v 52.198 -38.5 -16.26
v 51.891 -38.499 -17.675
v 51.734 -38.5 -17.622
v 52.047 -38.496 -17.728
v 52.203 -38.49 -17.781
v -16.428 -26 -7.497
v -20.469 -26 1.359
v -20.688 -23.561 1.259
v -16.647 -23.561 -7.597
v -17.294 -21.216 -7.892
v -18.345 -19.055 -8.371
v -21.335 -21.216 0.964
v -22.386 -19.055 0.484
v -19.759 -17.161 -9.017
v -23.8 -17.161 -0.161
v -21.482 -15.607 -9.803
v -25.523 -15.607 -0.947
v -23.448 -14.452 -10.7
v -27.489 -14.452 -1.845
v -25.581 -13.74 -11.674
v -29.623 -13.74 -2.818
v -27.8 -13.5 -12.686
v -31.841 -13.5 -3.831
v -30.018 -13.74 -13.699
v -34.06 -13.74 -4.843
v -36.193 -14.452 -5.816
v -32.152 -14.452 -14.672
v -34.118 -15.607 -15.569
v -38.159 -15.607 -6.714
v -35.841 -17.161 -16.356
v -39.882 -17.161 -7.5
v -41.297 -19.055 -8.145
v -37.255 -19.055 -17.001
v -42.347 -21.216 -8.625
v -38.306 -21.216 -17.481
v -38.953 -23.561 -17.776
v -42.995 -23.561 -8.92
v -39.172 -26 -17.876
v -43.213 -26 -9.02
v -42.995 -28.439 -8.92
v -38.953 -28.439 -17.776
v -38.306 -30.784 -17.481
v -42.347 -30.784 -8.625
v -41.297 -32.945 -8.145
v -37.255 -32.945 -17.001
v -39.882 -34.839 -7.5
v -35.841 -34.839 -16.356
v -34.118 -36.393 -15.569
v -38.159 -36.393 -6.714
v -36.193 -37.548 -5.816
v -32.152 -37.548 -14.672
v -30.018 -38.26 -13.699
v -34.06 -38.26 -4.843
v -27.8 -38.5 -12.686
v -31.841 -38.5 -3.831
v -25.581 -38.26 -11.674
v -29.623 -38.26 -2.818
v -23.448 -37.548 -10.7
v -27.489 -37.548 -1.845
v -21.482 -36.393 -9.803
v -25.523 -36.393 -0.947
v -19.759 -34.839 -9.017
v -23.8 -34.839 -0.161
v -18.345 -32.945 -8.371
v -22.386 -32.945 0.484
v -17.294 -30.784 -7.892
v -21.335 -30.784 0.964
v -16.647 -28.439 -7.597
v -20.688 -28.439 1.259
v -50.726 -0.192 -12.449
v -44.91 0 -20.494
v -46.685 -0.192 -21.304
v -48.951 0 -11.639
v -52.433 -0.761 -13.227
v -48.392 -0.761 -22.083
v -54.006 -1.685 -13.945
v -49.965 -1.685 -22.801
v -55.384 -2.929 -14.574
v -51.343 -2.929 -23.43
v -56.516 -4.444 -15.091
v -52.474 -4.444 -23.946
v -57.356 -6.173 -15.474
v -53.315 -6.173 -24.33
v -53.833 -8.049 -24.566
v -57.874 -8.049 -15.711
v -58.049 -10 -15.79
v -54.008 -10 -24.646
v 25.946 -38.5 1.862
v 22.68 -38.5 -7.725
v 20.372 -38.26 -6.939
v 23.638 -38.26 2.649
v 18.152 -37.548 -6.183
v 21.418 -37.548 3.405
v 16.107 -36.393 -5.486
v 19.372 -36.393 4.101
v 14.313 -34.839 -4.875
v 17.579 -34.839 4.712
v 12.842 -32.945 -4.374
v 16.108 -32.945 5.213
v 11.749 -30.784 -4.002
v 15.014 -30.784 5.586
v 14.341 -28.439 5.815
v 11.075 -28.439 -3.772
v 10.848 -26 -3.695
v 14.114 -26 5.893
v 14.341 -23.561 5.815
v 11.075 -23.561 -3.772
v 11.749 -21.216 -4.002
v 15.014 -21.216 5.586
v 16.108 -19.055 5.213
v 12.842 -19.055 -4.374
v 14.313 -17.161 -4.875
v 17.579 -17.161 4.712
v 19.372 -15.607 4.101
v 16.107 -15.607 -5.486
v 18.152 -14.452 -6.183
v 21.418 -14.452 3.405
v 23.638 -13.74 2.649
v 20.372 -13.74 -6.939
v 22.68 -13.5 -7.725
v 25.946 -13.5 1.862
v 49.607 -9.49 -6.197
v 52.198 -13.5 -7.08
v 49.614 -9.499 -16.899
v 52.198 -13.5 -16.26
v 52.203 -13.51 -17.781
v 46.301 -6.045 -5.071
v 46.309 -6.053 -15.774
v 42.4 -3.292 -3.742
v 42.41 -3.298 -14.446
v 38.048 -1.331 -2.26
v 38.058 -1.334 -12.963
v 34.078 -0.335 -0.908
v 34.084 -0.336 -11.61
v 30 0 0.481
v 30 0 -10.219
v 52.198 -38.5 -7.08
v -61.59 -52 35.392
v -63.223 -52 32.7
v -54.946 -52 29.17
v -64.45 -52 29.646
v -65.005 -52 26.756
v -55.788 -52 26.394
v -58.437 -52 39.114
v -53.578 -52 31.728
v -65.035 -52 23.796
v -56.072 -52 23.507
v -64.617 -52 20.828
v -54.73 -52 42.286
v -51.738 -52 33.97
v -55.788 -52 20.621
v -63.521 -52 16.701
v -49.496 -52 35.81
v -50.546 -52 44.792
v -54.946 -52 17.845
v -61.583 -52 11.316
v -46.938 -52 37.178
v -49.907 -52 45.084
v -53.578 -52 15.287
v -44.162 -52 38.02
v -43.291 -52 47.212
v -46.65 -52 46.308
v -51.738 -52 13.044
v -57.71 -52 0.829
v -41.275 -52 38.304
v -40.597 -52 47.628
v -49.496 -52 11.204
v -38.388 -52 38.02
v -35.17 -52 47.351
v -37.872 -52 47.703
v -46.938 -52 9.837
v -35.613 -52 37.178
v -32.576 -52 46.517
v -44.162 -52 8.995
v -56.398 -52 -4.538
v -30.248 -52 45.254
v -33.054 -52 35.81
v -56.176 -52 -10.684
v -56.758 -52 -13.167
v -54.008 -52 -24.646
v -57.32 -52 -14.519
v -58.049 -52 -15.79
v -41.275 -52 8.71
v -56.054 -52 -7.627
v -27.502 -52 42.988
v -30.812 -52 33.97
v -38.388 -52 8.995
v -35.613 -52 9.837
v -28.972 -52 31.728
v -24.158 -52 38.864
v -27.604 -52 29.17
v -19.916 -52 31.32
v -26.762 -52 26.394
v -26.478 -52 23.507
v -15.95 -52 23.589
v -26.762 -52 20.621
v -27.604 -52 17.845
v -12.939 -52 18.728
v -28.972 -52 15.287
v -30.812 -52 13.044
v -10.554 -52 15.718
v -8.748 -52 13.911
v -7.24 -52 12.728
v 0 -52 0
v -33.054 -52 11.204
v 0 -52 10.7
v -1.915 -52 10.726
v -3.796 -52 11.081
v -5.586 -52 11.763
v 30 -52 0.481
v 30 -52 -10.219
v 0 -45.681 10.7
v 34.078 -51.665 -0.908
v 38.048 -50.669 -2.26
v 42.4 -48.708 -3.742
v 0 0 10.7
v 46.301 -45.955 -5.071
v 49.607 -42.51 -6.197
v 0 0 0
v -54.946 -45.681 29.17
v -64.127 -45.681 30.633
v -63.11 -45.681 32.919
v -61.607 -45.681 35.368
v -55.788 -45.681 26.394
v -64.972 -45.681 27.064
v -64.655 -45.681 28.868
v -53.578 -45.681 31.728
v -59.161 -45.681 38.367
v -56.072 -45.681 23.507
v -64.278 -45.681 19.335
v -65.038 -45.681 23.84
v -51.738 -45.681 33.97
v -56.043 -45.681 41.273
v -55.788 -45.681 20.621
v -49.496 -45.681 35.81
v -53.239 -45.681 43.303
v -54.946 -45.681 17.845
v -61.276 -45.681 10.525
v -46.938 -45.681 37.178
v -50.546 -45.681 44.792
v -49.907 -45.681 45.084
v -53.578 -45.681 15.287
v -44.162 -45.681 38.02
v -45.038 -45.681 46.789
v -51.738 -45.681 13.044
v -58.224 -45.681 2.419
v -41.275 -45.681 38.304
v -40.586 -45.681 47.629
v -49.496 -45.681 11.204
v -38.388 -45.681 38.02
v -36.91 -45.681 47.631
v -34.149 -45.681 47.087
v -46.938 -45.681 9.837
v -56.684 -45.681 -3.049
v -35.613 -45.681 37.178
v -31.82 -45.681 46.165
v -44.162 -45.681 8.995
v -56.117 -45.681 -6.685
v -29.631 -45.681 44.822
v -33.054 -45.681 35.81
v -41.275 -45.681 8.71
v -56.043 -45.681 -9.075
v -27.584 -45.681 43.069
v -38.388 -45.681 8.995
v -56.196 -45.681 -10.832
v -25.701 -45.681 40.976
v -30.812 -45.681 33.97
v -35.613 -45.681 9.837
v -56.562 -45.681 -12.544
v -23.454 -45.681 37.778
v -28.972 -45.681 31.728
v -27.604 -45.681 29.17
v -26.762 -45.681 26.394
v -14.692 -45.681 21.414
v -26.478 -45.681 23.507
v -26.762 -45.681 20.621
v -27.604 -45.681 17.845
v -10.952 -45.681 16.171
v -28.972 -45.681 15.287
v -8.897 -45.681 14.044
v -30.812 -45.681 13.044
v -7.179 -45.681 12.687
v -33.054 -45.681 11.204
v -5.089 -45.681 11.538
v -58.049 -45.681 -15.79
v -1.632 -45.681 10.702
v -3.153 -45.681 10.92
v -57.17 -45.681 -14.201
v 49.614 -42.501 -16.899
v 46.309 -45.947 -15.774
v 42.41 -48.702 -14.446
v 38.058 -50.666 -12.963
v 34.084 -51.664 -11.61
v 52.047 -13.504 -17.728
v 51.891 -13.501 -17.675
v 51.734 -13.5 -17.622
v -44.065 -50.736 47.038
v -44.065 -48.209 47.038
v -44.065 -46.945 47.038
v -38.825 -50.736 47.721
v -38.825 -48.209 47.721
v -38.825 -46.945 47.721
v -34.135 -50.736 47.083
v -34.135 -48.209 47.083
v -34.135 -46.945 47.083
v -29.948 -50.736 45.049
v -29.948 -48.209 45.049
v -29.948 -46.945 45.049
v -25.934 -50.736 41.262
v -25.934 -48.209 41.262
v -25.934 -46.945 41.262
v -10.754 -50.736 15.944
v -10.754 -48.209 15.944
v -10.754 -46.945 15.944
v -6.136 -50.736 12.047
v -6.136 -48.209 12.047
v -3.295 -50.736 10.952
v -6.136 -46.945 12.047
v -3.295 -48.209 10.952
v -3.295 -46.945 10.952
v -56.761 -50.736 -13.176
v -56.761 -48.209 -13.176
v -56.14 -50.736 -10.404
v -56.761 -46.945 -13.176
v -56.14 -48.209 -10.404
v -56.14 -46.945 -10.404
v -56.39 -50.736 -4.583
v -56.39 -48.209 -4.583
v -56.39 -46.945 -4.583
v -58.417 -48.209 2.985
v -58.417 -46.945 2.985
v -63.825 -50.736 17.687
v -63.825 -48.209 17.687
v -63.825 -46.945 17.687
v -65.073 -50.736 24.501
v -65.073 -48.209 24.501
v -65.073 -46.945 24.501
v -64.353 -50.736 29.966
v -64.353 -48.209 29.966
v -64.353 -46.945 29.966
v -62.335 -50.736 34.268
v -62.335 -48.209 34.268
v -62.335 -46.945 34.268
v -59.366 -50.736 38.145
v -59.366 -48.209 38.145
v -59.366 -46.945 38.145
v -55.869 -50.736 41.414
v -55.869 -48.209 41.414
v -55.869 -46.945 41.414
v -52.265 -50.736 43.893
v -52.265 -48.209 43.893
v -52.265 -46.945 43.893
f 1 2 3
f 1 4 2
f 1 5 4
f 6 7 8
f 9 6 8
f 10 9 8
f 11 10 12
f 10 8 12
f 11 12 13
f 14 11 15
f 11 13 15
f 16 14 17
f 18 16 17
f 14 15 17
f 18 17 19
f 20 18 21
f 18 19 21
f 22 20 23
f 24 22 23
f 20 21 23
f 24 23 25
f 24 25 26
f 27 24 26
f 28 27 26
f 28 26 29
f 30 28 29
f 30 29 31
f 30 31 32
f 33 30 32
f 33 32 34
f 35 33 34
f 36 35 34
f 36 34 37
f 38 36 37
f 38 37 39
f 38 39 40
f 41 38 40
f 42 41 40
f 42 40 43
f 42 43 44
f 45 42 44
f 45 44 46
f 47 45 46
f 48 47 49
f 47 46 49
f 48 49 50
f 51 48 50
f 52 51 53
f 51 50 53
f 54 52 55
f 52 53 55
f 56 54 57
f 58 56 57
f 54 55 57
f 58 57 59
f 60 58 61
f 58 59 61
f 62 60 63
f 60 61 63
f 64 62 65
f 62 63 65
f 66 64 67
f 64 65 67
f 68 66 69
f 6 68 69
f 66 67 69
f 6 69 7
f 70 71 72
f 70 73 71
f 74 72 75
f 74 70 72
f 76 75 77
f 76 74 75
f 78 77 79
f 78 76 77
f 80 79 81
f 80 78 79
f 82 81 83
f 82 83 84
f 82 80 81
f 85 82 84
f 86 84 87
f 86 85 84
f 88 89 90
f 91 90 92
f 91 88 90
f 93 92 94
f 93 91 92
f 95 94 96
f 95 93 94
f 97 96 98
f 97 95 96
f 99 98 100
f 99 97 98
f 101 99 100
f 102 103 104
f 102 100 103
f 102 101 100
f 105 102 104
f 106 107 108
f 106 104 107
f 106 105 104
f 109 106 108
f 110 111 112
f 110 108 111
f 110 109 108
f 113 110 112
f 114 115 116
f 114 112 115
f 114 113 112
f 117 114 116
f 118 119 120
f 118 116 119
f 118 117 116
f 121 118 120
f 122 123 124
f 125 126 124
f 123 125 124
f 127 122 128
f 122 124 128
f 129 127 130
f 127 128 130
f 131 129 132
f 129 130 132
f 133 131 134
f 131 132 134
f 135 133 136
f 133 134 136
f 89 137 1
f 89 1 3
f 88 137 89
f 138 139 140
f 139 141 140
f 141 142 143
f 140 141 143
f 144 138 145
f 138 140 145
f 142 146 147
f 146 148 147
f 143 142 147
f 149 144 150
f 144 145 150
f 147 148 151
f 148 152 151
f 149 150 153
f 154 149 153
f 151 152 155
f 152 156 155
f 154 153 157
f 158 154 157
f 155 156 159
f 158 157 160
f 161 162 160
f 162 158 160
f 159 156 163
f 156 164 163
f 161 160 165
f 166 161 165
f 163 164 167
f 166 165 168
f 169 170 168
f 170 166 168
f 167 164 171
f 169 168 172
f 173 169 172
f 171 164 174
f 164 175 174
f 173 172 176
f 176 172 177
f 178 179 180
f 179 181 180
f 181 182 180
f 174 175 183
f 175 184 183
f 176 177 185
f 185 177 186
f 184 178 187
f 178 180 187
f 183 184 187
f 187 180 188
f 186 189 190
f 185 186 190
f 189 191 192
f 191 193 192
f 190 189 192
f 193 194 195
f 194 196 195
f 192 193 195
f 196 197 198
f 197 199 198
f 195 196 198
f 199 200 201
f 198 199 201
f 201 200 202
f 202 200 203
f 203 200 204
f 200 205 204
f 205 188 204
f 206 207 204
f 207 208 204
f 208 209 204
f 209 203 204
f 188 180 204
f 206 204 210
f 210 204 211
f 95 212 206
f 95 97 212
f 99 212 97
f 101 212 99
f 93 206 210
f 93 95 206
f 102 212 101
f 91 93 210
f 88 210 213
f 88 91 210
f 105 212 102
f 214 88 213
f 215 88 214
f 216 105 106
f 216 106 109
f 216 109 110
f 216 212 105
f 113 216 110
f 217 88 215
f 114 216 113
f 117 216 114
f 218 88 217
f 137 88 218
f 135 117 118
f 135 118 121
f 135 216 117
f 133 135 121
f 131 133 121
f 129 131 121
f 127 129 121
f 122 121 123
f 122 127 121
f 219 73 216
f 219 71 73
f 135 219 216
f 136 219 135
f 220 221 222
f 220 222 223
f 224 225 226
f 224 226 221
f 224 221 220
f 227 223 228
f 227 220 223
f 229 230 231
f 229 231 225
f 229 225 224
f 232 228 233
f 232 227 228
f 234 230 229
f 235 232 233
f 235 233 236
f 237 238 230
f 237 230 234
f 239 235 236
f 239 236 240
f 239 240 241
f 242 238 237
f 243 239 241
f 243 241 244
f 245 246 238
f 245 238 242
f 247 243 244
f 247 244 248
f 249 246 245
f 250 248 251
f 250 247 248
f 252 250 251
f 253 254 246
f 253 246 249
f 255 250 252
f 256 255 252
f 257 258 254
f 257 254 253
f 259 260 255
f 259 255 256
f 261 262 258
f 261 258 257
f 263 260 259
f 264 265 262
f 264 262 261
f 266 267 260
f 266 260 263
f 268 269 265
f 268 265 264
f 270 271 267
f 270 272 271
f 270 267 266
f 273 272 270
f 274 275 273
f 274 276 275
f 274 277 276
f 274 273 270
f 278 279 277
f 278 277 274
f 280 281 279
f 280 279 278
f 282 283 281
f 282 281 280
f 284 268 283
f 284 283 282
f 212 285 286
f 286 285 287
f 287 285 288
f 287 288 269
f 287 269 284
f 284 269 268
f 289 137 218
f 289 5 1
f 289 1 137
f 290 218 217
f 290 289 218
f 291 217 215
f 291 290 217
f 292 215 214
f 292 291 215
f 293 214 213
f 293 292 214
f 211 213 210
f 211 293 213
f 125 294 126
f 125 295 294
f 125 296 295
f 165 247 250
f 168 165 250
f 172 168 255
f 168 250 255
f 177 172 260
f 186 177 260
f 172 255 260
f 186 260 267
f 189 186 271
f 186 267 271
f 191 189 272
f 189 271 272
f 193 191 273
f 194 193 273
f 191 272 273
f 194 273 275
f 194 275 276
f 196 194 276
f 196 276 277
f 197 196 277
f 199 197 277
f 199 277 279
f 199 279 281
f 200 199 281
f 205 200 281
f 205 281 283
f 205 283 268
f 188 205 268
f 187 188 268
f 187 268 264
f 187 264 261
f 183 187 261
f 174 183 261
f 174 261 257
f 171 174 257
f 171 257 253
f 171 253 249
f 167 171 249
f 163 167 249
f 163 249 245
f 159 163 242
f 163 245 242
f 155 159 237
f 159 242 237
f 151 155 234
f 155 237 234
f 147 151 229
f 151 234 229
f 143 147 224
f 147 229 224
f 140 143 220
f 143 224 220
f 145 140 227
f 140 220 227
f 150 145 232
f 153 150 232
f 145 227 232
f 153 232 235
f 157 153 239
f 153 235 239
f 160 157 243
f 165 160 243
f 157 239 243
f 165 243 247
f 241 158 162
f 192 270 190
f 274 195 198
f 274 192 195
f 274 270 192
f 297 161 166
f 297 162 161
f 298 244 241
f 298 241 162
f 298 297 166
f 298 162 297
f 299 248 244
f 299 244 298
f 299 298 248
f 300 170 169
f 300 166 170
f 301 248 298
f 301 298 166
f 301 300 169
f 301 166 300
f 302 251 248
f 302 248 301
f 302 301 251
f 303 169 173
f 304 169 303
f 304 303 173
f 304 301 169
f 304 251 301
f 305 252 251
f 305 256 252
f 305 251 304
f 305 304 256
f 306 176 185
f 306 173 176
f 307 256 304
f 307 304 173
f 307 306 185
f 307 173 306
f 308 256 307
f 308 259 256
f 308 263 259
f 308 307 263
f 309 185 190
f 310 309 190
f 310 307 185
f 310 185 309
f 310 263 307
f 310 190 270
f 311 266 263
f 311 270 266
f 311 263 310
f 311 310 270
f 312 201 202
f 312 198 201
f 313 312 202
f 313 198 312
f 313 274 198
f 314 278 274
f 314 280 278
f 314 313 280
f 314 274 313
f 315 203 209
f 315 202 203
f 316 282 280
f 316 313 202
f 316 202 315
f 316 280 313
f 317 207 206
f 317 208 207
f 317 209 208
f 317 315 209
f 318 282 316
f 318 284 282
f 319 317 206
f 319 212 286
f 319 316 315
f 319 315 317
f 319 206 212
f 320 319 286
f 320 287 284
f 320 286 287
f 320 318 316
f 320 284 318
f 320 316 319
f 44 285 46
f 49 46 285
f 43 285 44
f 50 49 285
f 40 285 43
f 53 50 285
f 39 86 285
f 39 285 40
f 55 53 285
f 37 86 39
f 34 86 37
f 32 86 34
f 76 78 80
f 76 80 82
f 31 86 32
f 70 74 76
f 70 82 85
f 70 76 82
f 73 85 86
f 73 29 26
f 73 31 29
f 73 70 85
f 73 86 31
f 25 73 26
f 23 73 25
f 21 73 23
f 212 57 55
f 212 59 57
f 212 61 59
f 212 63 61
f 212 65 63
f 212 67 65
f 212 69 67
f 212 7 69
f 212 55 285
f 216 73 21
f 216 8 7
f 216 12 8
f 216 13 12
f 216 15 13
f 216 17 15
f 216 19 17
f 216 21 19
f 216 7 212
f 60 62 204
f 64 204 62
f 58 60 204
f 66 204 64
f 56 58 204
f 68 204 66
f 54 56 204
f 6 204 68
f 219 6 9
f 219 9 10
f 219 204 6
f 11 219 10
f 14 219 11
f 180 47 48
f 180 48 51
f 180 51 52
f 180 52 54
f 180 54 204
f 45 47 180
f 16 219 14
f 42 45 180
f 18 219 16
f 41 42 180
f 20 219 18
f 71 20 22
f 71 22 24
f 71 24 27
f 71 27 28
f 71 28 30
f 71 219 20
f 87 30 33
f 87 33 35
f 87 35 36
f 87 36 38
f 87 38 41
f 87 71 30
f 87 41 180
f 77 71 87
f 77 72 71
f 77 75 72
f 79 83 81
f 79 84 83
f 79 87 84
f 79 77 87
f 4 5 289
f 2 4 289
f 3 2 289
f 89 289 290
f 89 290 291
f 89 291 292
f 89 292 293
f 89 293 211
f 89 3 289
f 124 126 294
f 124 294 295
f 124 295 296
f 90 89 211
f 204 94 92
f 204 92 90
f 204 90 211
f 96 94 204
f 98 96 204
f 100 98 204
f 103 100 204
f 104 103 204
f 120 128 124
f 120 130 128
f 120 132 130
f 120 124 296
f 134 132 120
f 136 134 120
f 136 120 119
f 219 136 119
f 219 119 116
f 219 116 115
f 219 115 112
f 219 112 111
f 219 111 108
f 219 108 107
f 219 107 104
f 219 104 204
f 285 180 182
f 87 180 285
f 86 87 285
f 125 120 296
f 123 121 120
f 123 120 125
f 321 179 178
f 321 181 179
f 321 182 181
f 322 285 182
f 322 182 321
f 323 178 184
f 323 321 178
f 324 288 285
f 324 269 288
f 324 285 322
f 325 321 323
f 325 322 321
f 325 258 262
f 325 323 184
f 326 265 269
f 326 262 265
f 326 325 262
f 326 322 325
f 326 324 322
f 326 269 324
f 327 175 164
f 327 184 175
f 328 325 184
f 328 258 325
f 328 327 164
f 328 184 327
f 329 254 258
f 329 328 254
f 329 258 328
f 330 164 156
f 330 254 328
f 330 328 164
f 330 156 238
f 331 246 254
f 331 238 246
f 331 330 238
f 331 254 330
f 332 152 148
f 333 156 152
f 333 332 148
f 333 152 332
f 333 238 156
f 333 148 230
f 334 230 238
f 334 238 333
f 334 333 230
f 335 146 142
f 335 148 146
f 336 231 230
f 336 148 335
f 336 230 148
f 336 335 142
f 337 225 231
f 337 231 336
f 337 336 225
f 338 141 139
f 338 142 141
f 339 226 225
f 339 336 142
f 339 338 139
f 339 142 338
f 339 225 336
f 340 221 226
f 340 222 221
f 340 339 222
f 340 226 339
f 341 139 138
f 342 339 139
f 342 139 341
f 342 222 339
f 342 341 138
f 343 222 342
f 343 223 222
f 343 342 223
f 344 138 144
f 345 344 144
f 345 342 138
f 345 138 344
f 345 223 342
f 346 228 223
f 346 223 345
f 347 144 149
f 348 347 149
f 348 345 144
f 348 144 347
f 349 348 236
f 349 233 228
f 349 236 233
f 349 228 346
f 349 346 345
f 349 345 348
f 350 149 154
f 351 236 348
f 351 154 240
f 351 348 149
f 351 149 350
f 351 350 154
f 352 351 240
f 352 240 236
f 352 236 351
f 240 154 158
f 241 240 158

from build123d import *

# Parameters (mm, degrees)
BOSS_EXTRUDE1_DEPTH = 52
FILLET1_R           = 25
CUT_EXTRUDE1_DEPTH  = 52
FILLET2_R           = 10
SKETCH3_R           = 12.5
CUT_EXTRUDE2_DEPTH  = 52
SKETCH5_W           = 63.955413662
SKETCH5_H           = 6.318805718
BOSS_EXTRUDE2_DEPTH = 52
SKETCH6_R           = 14.796953782
CUT_EXTRUDE5_DEPTH  = 12


with BuildPart() as part:
    # Sketch1 → Boss-Extrude1 (new body)
    with BuildSketch(Plane(origin=(0, 0, 0), x_dir=(1, 0, 0), z_dir=(0, 1, 0))):
        Polygon((0, 0), (-54.007699651, 24.646064638), (-58.048980527, 15.790278249), (0, -10.699998794), (55, 8.034068022), (55, 18.734066816), align=None)
    extrude(amount=-BOSS_EXTRUDE1_DEPTH)

    # Fillet1
    fillet1_edges = [part.edges().sort_by_distance(p)[0] for p in [
        (55, -52, -13.384067419),
        (55, 0, -13.384067419),
    ]]
    fillet(fillet1_edges, radius=FILLET1_R)

    # Sketch2 → Cut-Extrude1 (cut)
    with BuildSketch(Plane(origin=(3.265731793, 0, 9.587627201), x_dir=(0.9465939078280105, 0, -0.32242824575848833), z_dir=(0.32242824575848833, 0, 0.9465939078280106))):
        with BuildLine():
            Line((54.653075389, -38.5), (23.959854488, -38.5))
            ThreePointArc((23.959854488, -38.5), (11.459854488, -26), (23.959854488, -13.5))
            Line((23.959854488, -13.5), (54.653075389, -13.5))
            ThreePointArc((54.653075389, -13.5), (67.153075389, -26), (54.653075389, -38.5))
        make_face()
    extrude(amount=-CUT_EXTRUDE1_DEPTH, mode=Mode.SUBTRACT)

    # Fillet2
    fillet2_edges = [part.edges().sort_by_distance(p)[0] for p in [
        (-56.028340089, 0, -20.218171443),
    ]]
    fillet(fillet2_edges, radius=FILLET2_R)

    # Sketch3 → Cut-Extrude2 (cut)
    with BuildSketch(Plane(origin=(-4.041280876, 0, 8.855786388), x_dir=(0.9097492407271736, 0, 0.4151581855104526), z_dir=(-0.4151581855104526, 0, 0.9097492407271736))):
        with Locations((-30.557807916, -26)):
            Circle(SKETCH3_R)
    extrude(amount=-CUT_EXTRUDE2_DEPTH, mode=Mode.SUBTRACT)

    # Sketch5 → Boss-Extrude2 (add)
    with BuildSketch(Plane(origin=(-4.041280876, 0, 8.855786388), x_dir=(0.9097492407271736, 0, 0.4151581855104526), z_dir=(-0.4151581855104526, 0, 0.9097492407271736))):
        with Locations((-27.387772395, -48.840597141)):
            Rectangle(SKETCH5_W, SKETCH5_H)
    extrude(amount=BOSS_EXTRUDE2_DEPTH)

    # Sketch6 → Cut-Extrude5 (cut)
    with BuildSketch(Plane(origin=(0, -45.681194282, 0), x_dir=(1, 0, 0), z_dir=(0, 1, 0))):
        with Locations(Location((-41.275083904, -23.507254491, 0), (0, 0, 270))):
            Circle(SKETCH6_R)
        with BuildLine():
            add(Edge.make_bspline(
                [(-58.048980527, 15.790278249), (-55.831409205, 12.43111817), (-55.468462462, -1.484994571), (-66.211863789, -17.980786489), (-64.125030252, -34.334258251), (-56.260496604, -41.858023354), (-51.107014647, -44.526823974), (-50.545511664, -44.792489014)],
                knots=[0, 0, 0, 0, 0.058811155, 0.20931912, 0.241844454, 0.351539163, 0.365251001, 0.365251001, 0.365251001, 0.365251001], degree=3))
            Line((-58.048980527, 15.790278249), (-79.637206174, -31.516682269))
            Line((-79.637206174, -31.516682269), (-50.545511664, -44.792489014))
        make_face()
        with BuildLine():
            add(Edge.make_bspline(
                [(-49.907067766, -45.08383876), (-49.177932221, -45.404712271), (-41.127943342, -48.502484641), (-33.005537612, -48.370799962), (-20.855856008, -36.685330942), (-16.080658073, -18.863651279), (-4.727836106, -10.381149917), (0, -10.699998794)],
                knots=[0.370486493, 0.370486493, 0.370486493, 0.370486493, 0.388554906, 0.574986146, 0.630925752, 0.892011359, 1, 1, 1, 1], degree=3))
            Line((-49.907067766, -45.08383876), (-21.453817154, -58.068295759))
            Line((-21.453817154, -58.068295759), (0.134408493, -10.761335241))
            Line((0.134408493, -10.761335241), (0, -10.699998794))
        make_face()
    extrude(amount=-CUT_EXTRUDE5_DEPTH, mode=Mode.SUBTRACT)


solid = part.part
